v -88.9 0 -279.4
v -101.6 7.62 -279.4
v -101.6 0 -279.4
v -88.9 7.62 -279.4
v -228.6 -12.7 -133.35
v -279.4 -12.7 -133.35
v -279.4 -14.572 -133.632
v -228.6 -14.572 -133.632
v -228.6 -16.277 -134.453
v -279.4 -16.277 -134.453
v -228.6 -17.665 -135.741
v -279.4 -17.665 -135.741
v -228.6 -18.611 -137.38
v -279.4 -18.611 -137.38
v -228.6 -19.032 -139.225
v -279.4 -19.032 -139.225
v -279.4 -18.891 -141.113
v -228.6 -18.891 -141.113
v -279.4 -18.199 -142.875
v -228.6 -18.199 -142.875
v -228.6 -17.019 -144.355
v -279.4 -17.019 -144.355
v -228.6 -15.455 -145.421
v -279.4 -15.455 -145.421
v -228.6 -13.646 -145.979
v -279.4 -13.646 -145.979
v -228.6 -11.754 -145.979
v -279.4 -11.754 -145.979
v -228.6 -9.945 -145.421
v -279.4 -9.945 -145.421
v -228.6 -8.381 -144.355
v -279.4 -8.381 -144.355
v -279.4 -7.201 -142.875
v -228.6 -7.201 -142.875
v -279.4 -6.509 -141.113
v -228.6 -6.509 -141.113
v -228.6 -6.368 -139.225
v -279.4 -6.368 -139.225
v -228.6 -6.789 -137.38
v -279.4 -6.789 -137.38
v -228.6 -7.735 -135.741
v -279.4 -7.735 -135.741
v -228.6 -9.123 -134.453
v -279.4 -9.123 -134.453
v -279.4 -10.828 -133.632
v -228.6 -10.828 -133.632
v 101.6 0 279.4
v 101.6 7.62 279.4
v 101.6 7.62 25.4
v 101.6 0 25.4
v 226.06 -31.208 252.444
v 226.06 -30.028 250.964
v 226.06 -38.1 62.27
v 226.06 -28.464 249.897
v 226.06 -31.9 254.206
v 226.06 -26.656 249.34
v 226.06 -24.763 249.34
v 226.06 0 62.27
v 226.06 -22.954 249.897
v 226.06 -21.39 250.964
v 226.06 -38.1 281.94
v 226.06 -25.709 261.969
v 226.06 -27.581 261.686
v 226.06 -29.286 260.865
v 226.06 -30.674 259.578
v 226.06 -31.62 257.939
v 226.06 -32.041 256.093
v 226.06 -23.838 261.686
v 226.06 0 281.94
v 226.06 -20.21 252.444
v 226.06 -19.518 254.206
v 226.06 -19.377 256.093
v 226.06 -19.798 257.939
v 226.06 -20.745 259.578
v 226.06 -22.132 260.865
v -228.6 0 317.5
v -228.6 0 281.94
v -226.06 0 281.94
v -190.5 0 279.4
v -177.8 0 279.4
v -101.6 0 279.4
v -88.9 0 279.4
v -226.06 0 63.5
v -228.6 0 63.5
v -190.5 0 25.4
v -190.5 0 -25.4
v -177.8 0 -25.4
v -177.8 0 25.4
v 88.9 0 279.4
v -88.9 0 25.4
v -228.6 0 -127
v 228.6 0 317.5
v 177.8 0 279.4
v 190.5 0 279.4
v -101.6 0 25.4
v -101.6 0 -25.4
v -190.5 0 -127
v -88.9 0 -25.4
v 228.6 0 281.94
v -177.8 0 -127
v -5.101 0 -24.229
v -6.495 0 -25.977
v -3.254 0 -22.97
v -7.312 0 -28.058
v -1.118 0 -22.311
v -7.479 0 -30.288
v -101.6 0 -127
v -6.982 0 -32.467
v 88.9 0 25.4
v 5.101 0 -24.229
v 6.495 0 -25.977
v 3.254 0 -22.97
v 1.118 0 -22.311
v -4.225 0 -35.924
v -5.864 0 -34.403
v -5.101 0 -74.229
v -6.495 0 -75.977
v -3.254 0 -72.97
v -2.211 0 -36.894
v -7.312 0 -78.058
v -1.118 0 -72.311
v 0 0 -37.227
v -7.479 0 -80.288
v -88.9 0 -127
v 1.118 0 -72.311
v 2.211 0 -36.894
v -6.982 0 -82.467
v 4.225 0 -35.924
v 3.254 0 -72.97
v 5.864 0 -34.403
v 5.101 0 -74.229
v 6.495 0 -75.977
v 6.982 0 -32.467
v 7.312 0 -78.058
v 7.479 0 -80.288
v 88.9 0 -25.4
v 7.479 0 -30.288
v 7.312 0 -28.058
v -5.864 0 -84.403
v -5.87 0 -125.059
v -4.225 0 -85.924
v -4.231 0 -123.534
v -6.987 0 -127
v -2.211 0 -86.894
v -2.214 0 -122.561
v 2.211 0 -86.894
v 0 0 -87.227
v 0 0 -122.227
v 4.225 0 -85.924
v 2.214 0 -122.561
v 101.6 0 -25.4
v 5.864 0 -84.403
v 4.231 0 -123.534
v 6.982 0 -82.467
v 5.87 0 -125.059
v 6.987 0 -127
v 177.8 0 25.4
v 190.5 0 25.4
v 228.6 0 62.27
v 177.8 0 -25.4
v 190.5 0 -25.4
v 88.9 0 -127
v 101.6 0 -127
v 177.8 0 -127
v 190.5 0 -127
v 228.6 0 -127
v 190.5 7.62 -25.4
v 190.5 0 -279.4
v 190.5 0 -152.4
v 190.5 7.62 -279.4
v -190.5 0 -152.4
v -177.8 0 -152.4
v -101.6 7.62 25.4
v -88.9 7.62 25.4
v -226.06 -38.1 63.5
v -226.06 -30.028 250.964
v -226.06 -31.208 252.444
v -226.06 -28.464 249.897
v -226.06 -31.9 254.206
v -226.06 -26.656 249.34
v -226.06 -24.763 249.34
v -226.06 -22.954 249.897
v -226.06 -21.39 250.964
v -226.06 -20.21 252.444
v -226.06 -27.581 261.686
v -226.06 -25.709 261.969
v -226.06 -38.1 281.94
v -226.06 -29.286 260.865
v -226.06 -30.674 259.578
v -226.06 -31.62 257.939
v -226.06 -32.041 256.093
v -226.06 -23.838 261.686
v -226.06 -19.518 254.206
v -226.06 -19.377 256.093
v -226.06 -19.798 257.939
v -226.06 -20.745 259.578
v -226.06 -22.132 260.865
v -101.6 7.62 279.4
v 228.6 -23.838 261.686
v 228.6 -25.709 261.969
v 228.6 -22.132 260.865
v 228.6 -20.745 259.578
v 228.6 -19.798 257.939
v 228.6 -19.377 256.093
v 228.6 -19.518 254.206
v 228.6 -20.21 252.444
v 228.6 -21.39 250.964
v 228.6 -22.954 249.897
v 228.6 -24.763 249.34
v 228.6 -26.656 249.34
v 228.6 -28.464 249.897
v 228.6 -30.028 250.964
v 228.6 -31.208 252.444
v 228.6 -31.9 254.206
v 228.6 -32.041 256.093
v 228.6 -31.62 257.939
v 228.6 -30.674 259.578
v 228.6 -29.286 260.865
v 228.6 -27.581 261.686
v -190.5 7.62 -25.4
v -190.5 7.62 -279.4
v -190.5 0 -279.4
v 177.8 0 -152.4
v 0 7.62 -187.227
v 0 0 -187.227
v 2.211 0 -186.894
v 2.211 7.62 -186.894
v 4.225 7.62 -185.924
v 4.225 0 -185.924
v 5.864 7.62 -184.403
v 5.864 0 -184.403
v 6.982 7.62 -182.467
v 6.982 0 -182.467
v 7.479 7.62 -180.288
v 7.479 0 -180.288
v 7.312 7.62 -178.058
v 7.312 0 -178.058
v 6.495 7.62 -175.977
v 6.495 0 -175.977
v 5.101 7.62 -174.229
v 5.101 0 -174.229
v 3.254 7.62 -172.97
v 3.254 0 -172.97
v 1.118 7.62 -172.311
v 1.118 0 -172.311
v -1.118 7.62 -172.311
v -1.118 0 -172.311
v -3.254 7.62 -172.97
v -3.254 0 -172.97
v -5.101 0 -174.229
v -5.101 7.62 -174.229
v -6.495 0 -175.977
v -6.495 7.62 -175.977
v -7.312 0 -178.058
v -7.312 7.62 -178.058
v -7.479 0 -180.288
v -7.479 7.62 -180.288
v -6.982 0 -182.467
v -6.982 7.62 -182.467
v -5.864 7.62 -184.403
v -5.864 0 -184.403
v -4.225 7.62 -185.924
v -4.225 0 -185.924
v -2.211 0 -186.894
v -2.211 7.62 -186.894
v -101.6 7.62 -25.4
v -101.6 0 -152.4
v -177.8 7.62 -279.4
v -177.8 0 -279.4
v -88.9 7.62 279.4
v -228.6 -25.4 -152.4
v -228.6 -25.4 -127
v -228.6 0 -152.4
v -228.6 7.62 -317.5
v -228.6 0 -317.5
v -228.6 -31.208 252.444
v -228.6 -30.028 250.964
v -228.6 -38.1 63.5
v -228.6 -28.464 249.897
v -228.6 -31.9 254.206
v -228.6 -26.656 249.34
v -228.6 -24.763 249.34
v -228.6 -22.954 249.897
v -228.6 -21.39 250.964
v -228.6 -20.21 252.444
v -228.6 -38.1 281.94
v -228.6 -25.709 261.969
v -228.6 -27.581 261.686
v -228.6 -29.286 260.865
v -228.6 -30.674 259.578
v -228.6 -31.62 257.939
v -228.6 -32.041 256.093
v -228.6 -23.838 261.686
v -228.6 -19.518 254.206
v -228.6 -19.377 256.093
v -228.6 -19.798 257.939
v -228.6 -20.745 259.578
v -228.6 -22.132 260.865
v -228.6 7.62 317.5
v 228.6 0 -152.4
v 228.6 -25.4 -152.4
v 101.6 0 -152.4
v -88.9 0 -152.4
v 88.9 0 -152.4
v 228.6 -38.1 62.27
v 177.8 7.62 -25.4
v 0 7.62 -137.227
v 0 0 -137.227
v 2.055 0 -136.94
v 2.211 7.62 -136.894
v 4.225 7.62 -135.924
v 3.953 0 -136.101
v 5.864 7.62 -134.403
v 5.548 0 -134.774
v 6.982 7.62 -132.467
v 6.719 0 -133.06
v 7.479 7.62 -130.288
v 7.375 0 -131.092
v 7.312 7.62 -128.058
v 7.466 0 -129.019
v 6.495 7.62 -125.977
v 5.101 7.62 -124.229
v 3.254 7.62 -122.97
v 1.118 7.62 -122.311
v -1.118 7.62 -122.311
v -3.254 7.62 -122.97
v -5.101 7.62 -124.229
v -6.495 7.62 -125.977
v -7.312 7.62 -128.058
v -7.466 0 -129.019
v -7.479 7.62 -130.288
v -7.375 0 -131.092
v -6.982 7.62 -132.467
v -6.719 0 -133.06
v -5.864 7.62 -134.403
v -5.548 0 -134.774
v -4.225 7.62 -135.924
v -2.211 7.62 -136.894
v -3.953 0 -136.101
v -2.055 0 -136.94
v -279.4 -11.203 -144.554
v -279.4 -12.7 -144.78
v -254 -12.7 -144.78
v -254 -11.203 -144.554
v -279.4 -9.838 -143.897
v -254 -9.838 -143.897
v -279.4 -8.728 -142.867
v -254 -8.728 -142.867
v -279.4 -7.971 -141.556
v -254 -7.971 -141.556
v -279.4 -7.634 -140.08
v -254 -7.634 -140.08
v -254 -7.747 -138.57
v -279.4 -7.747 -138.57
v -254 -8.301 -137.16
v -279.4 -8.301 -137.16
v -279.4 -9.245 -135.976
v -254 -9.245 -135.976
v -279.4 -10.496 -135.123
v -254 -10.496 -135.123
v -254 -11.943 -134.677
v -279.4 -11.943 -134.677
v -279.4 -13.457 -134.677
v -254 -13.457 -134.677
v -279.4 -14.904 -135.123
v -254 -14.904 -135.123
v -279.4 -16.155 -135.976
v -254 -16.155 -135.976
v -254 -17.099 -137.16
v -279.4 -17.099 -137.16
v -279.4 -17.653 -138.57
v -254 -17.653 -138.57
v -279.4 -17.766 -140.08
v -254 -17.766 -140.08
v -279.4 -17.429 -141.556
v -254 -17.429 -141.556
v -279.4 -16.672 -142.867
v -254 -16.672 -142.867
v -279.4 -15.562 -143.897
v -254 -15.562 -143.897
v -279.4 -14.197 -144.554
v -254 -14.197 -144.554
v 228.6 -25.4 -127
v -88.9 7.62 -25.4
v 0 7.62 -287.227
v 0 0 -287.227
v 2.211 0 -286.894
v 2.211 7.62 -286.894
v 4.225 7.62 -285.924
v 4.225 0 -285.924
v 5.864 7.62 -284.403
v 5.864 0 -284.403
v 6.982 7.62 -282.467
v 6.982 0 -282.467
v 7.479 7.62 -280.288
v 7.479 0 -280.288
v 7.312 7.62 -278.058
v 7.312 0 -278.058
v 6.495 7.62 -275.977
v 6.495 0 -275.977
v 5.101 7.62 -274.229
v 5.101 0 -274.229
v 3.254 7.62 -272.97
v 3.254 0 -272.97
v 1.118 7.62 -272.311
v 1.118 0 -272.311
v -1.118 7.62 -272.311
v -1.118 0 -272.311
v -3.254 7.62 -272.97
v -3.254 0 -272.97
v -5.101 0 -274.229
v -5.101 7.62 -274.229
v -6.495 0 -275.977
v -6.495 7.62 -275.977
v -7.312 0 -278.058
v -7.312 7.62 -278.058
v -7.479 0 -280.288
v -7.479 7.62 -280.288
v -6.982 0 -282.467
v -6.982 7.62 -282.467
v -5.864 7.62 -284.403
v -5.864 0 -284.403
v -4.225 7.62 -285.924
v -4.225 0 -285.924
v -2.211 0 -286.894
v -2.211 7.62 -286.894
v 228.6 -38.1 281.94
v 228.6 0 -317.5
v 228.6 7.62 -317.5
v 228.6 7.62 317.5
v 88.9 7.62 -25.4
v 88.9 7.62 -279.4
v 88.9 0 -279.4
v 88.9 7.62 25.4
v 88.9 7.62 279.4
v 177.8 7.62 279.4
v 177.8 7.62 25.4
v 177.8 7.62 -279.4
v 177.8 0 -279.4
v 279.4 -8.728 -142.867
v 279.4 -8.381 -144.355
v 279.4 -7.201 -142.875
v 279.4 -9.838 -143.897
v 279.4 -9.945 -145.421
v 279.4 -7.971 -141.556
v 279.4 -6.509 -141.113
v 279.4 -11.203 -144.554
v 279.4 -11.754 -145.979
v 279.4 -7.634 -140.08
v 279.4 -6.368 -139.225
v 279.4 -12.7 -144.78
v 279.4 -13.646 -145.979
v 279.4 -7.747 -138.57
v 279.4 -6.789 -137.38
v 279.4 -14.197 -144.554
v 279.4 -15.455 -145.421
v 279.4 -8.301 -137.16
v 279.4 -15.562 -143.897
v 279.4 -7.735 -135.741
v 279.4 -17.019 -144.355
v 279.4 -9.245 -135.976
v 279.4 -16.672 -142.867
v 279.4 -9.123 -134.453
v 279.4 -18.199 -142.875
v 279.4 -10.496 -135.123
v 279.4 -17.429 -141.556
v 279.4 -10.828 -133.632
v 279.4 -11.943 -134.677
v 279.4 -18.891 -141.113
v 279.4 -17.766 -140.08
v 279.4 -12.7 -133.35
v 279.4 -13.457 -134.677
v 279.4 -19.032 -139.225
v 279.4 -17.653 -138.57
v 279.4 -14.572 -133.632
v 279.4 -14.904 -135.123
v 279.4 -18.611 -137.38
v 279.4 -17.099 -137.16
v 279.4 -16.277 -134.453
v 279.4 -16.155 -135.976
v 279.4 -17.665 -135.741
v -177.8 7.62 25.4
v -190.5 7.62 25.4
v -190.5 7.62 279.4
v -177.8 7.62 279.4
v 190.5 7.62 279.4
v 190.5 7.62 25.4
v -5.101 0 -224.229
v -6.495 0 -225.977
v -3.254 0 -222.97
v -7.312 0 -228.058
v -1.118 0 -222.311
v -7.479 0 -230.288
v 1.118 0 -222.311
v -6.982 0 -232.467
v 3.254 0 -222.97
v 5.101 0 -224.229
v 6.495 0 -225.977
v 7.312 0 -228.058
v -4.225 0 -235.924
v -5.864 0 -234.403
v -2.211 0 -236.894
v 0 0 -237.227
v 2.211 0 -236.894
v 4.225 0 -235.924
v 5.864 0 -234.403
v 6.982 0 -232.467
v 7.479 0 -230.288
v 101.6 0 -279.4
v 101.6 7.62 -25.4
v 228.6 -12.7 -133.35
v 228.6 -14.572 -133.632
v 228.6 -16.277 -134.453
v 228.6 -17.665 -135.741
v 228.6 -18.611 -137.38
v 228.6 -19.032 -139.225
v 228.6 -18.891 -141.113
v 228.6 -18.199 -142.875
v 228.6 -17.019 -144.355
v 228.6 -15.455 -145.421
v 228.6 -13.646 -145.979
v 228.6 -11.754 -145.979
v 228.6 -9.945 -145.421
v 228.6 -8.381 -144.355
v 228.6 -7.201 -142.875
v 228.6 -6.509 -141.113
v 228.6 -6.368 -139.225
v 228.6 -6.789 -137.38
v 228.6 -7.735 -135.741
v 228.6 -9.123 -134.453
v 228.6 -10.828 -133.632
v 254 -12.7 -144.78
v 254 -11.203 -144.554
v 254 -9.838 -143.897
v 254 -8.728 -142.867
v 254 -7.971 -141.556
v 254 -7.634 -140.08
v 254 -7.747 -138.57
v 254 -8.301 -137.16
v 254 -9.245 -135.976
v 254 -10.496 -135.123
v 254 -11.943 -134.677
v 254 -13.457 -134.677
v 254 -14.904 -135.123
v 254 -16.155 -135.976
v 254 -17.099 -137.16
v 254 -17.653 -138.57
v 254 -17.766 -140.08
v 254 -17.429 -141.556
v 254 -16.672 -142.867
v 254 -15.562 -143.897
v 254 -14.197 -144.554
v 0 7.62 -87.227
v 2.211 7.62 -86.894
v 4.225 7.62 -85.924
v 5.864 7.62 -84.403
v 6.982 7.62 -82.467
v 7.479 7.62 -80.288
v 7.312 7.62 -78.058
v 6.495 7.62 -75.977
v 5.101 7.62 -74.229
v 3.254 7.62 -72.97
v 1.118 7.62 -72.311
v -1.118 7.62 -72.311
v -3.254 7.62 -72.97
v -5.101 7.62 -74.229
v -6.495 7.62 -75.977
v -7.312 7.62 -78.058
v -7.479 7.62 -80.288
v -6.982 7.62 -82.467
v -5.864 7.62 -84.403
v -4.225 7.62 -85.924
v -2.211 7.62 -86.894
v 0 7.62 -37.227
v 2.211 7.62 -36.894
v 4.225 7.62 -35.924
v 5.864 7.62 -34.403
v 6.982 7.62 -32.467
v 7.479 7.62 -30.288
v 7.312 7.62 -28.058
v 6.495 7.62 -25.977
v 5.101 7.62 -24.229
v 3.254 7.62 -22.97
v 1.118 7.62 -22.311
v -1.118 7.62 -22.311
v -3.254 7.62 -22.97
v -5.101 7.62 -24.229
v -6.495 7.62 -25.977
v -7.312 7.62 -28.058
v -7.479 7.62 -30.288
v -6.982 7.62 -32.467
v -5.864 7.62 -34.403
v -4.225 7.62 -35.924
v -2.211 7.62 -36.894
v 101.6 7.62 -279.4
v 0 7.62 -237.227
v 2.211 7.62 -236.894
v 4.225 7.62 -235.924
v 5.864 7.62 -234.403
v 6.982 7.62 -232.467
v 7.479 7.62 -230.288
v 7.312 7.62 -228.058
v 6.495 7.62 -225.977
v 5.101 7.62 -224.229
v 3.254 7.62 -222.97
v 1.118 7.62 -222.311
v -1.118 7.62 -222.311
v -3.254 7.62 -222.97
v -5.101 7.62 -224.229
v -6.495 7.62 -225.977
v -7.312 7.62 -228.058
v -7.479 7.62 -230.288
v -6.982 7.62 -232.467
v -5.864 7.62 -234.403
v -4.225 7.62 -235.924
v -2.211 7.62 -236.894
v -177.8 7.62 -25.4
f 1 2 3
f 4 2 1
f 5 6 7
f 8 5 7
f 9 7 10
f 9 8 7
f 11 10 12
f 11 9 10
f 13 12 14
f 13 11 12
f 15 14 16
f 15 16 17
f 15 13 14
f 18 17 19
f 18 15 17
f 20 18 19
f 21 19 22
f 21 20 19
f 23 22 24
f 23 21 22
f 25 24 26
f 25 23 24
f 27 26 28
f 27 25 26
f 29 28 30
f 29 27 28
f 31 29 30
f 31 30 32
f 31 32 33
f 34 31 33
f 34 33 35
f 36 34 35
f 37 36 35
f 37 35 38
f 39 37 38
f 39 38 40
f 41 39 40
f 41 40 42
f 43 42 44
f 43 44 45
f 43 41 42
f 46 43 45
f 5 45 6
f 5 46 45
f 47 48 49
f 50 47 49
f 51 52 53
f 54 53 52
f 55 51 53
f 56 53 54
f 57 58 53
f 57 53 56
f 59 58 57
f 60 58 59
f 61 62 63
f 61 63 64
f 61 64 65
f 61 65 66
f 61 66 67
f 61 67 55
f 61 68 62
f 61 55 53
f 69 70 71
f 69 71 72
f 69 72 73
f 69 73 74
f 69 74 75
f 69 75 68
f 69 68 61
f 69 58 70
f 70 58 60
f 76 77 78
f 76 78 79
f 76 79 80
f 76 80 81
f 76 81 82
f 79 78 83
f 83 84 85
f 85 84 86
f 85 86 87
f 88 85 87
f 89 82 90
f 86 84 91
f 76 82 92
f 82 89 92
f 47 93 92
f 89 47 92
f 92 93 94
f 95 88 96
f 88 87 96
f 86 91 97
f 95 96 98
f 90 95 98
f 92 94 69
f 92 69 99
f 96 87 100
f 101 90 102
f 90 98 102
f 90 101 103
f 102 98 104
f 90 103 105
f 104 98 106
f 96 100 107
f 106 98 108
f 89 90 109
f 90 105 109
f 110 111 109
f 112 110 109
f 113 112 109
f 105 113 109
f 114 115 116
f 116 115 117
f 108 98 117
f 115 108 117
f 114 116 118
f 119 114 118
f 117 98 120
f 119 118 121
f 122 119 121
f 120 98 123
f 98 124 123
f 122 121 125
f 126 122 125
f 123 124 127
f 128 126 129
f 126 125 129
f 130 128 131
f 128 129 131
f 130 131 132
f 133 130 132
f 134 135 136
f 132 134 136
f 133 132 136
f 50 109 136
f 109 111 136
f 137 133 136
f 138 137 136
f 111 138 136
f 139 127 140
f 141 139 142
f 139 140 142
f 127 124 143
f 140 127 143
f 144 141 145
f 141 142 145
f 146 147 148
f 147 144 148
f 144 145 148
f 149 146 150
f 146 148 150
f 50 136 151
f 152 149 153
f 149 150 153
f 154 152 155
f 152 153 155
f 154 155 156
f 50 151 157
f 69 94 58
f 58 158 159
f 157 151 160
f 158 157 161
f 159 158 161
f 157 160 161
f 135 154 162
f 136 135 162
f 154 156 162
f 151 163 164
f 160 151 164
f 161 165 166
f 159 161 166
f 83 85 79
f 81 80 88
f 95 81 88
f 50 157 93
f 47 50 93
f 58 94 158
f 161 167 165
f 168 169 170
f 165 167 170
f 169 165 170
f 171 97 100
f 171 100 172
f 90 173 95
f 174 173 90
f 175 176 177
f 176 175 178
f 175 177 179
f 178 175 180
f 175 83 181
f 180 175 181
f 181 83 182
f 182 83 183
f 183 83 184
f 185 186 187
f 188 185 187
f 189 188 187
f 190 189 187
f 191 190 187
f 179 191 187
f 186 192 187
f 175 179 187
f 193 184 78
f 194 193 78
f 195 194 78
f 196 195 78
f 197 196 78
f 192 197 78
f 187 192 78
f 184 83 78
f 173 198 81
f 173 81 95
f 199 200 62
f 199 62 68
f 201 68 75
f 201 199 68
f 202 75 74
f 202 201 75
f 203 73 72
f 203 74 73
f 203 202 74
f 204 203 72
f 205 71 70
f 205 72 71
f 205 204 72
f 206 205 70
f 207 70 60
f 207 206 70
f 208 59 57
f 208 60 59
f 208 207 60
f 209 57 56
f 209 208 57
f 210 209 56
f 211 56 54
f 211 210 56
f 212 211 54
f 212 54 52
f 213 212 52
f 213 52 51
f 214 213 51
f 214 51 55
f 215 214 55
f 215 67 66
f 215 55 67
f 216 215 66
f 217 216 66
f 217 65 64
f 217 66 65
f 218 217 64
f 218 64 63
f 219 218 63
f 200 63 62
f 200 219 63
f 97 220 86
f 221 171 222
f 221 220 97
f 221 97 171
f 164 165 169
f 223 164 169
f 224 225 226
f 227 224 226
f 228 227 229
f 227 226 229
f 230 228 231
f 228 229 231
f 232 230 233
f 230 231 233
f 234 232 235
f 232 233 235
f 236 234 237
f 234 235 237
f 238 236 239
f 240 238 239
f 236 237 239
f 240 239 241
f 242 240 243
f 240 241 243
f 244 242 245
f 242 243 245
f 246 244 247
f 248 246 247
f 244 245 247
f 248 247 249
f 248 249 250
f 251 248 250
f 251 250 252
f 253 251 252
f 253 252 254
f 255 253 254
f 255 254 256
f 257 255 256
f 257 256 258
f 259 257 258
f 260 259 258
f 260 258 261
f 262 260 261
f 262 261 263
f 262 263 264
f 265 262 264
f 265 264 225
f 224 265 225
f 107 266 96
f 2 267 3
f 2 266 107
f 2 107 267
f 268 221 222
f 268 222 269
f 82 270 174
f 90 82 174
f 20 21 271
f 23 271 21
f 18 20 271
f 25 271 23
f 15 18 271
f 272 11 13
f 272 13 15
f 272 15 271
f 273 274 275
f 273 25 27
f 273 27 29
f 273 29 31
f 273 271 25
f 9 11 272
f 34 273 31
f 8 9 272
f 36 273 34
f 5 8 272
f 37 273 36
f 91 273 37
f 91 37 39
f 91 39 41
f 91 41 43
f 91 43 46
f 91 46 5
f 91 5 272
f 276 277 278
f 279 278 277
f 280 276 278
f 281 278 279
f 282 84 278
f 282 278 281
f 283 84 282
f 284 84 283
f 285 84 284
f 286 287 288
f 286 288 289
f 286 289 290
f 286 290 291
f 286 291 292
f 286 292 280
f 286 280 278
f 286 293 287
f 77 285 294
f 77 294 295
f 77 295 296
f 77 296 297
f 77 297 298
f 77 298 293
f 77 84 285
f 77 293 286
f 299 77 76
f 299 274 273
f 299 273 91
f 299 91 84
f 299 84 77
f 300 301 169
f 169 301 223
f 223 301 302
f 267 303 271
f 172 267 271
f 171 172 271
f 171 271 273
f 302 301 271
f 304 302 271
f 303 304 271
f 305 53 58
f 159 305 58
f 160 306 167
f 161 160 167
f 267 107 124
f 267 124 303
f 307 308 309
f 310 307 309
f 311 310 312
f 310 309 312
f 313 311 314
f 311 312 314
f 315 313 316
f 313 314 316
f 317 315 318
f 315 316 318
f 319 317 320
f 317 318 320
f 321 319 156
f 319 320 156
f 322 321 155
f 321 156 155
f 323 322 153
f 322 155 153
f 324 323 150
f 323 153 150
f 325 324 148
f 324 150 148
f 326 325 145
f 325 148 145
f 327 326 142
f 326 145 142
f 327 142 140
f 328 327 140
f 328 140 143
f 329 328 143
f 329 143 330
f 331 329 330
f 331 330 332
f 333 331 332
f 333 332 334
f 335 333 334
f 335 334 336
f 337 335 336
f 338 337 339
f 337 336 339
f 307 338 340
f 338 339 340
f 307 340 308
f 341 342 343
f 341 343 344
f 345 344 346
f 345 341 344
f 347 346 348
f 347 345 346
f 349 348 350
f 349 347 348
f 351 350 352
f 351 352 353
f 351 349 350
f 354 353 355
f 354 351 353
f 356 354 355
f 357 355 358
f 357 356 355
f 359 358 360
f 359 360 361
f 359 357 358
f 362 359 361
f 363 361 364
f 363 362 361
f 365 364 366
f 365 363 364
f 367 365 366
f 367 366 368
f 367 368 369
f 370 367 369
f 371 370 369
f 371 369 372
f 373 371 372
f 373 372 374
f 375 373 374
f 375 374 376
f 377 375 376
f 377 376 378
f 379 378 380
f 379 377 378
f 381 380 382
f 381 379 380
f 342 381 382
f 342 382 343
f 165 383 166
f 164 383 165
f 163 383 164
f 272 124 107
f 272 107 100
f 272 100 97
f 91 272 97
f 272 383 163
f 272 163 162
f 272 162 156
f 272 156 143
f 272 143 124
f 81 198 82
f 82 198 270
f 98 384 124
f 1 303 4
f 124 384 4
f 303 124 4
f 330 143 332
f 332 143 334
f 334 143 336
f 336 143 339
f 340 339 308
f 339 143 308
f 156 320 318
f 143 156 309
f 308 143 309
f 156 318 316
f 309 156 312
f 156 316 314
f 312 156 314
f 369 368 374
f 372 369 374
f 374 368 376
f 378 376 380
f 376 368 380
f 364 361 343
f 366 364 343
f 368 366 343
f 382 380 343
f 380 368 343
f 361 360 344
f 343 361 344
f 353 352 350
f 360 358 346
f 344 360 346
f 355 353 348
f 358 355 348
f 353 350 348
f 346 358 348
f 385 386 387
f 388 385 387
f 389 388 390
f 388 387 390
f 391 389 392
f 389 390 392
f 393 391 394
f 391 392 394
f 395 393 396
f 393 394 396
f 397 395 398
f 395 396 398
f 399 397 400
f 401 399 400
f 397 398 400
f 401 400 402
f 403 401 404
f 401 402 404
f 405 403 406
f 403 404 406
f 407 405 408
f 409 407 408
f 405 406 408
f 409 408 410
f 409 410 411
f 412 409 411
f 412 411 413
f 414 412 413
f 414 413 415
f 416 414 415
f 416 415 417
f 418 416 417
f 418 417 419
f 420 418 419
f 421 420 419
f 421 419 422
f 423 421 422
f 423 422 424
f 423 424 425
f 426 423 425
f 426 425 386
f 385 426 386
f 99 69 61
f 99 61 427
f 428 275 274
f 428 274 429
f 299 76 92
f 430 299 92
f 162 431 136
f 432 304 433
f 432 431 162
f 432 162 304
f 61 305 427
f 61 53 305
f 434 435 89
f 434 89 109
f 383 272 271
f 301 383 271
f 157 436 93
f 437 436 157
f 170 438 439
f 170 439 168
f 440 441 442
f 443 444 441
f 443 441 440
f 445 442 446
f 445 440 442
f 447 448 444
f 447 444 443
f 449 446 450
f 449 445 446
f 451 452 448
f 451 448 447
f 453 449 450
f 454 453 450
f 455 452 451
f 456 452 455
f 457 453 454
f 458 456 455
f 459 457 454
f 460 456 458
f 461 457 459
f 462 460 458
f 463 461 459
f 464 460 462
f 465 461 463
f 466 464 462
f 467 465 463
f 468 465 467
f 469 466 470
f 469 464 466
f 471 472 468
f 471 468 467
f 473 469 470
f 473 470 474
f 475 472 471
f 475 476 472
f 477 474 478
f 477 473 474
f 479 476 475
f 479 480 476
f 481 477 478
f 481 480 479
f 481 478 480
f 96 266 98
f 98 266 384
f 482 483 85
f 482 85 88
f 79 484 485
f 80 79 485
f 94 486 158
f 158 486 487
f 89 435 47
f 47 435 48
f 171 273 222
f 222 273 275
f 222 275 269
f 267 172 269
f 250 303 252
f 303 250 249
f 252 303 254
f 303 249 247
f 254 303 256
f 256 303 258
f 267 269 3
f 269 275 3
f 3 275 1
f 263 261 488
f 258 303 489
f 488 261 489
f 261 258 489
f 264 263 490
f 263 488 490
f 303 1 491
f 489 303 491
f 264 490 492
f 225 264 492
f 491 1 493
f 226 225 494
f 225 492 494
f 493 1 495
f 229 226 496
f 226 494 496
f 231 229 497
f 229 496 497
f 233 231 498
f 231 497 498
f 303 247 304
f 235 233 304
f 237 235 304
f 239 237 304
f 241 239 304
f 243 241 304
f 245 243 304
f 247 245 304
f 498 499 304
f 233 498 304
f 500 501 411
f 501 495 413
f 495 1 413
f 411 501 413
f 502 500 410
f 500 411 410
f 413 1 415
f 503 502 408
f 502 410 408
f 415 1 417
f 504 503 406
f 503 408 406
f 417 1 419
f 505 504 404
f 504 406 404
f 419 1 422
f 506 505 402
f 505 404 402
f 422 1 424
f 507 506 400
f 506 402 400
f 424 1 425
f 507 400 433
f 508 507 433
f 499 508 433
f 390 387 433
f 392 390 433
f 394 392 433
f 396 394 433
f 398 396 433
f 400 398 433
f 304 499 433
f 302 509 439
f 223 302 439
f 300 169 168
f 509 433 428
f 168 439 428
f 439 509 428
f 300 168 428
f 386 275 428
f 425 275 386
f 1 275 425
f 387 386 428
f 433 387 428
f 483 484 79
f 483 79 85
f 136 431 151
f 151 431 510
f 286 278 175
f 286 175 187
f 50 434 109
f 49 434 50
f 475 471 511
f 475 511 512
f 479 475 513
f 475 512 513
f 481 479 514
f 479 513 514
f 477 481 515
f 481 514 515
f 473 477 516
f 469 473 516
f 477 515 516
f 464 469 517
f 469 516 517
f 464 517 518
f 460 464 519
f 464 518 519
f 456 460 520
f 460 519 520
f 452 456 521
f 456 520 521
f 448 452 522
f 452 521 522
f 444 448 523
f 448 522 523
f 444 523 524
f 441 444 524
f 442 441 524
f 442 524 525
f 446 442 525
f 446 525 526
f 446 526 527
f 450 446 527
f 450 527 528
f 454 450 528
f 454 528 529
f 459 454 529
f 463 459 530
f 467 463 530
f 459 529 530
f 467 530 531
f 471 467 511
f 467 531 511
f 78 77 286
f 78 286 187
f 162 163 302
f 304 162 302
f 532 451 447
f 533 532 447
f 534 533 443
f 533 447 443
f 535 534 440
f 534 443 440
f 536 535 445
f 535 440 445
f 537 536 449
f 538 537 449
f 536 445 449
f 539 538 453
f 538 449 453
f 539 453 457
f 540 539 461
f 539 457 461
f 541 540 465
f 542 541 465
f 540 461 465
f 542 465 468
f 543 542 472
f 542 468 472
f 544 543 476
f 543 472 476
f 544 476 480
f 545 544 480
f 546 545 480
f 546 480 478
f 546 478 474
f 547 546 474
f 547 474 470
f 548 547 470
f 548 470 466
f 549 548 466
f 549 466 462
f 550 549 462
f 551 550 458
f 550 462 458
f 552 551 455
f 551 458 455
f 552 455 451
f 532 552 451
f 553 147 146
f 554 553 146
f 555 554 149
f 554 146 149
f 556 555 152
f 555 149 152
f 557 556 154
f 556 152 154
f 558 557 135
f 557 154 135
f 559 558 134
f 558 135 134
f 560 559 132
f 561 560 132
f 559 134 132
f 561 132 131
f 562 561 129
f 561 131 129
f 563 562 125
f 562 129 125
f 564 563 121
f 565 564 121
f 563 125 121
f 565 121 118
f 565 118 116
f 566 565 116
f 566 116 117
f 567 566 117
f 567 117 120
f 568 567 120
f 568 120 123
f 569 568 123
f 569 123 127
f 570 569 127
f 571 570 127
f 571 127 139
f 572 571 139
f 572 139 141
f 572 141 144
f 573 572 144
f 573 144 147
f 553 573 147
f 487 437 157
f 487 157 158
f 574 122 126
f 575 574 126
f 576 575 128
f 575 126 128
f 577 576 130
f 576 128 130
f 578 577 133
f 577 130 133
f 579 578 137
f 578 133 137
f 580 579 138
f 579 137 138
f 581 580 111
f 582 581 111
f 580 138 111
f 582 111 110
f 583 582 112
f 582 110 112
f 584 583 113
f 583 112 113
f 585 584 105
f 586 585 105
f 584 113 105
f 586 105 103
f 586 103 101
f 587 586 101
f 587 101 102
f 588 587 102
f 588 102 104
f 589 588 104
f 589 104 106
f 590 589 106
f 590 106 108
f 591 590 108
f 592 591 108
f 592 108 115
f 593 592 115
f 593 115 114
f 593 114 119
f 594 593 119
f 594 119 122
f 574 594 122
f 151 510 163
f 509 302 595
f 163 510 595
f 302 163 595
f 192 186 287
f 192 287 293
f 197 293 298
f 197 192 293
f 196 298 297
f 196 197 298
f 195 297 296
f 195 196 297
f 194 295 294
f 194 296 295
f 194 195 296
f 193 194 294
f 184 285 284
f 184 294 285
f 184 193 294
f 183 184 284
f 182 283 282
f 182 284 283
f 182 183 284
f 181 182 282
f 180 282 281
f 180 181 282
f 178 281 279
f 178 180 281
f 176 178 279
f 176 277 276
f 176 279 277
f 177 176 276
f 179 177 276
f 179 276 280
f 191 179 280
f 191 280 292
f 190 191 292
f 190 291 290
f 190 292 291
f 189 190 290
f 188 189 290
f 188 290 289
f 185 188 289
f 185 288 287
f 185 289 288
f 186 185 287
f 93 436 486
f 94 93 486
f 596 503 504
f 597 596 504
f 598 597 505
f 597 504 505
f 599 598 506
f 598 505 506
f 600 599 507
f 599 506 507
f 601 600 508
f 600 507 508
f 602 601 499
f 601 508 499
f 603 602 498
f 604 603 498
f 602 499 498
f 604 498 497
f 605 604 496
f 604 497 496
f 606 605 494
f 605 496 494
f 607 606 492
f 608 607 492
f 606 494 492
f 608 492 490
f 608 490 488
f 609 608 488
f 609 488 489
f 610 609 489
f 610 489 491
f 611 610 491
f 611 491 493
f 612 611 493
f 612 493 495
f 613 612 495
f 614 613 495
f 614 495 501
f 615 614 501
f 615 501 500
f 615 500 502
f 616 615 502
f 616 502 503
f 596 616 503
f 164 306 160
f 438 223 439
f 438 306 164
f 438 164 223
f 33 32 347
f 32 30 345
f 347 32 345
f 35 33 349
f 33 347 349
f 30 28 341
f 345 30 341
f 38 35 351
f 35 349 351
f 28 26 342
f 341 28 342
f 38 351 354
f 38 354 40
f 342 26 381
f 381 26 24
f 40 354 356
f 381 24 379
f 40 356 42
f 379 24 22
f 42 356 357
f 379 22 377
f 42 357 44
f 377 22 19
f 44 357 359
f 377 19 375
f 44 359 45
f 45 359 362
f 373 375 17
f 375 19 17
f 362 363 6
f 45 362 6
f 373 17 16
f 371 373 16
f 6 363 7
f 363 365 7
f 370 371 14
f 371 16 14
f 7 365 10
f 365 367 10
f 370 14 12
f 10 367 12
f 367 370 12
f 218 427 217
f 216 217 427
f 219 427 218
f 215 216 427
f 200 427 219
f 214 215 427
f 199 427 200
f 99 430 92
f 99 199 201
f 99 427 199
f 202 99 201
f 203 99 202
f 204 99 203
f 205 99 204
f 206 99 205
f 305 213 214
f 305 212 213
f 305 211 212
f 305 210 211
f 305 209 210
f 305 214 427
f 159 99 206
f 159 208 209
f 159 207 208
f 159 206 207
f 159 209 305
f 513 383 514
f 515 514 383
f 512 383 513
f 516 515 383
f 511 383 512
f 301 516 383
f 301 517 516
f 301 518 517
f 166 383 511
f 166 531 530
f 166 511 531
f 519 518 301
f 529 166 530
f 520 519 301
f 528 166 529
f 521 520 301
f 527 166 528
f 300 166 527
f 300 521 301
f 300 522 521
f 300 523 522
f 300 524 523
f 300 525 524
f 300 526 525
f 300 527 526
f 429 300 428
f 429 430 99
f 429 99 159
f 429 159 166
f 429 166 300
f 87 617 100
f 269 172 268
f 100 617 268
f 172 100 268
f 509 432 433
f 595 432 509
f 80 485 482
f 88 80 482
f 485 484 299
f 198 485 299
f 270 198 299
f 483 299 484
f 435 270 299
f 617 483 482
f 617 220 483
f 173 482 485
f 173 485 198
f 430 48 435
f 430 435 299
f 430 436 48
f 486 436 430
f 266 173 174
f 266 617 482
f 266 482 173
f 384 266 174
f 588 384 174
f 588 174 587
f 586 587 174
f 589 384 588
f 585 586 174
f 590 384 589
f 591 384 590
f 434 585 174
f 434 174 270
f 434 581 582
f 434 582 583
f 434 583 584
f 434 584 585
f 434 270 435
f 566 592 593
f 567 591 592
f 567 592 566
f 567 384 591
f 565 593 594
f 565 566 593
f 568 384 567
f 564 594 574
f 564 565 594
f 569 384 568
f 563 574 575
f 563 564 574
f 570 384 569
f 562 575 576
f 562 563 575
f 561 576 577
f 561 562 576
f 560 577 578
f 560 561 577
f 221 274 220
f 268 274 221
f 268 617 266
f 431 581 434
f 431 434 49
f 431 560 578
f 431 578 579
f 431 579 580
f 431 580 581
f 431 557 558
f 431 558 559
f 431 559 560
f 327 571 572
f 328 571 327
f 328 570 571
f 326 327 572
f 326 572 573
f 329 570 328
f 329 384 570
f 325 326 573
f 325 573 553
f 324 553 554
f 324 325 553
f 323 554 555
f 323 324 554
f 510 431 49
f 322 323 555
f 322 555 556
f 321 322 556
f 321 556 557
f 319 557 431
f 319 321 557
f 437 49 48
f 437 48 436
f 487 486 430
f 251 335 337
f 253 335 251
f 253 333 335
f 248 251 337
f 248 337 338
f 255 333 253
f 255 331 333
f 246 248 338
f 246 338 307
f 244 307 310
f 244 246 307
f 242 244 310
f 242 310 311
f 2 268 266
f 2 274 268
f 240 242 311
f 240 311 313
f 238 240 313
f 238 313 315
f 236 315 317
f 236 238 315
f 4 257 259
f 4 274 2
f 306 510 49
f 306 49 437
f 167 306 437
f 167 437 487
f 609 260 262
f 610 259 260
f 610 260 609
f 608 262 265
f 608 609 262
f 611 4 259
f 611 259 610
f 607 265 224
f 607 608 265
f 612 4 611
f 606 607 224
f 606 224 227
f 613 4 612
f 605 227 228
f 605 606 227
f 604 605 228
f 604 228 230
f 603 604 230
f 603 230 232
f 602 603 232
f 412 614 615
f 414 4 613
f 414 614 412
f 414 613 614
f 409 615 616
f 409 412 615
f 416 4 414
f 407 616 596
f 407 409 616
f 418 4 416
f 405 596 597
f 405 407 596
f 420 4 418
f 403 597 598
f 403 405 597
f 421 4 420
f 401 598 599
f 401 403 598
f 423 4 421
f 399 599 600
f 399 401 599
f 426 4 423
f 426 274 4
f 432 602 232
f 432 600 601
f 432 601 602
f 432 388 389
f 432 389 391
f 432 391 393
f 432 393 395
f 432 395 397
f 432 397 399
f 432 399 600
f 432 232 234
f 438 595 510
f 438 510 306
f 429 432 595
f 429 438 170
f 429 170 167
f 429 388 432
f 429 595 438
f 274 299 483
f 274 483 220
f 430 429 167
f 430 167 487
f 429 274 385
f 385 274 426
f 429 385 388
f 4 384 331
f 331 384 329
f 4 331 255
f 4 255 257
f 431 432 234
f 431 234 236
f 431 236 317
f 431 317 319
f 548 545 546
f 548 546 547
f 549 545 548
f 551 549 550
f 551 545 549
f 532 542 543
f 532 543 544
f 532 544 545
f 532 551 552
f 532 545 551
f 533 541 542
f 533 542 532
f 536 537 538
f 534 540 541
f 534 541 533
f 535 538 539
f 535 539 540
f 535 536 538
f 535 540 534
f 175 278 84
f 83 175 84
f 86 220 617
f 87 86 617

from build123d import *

# Parameters (mm, degrees)
SKETCH1_W               = 457.2
SKETCH1_H               = 635
BOSS_EXTRUDE1_DEPTH     = 7.62
SKETCH2_W               = 12.7
SKETCH2_H               = 254
CUT_EXTRUDE1_DEPTH      = 392.308413403
SKETCH5_W               = 25.4
SKETCH5_H               = 25.4
BOSS_EXTRUDE3_DEPTH     = 228.6
SKETCH6_R               = 6.35
BOSS_EXTRUDE4_DEPTH     = 50.8
BOSS_EXTRUDE6_DEPTH     = 38.1
CUT_EXTRUDE2_DEPTH      = 426.395026299
CUT_EXTRUDE2_DEPTH_BACK = 38.1
SKETCH8_W               = 152.4
SKETCH8_H               = 38.1
BOSS_EXTRUDE7_DEPTH     = 2.54
SKETCH9_W               = 457.2
SKETCH9_H               = 38.1
CUT_EXTRUDE3_DEPTH      = 10.16
CUT_EXTRUDE4_DEPTH      = 601.268156743
CUT_EXTRUDE4_DEPTH_BACK = 601.268156743
SKETCH10_R              = 6.35
SKETCH11_R              = 5.08
CUT_EXTRUDE5_DEPTH      = 25.4
SKETCH12_W              = 67.801888186
SKETCH12_H              = 38.1
CUT_EXTRUDE7_DEPTH      = 599.120114693
SKETCH16_R              = 7.5
CUT_EXTRUDE9_DEPTH      = 425.643638831
LPATTERN1_COUNT         = 5
LPATTERN1_PITCH         = 50
LPATTERN2_COUNT         = 3
LPATTERN2_PITCH         = 50


with BuildPart() as part:
    # Sketch1 → Boss-Extrude1 (new body)
    with BuildSketch(Plane(origin=(0, 0, 0), x_dir=(1, 0, 0), z_dir=(0, 1, 0))):
        Rectangle(SKETCH1_W, SKETCH1_H)
    extrude(amount=BOSS_EXTRUDE1_DEPTH)

    # Sketch2 → Cut-Extrude1 (cut, through all)
    with BuildSketch(Plane(origin=(0, 7.62, 0), x_dir=(1, 0, 0), z_dir=(0, 1, 0))):
        with Locations((-95.25, 152.4)):
            Rectangle(SKETCH2_W, SKETCH2_H)
        with Locations((-95.25, -152.4)):
            Rectangle(SKETCH2_W, SKETCH2_H)
        with Locations((-184.15, 152.4)):
            Rectangle(SKETCH2_W, SKETCH2_H)
        with Locations((-184.15, -152.4)):
            Rectangle(SKETCH2_W, SKETCH2_H)
        with Locations((184.15, 152.4)):
            Rectangle(SKETCH2_W, SKETCH2_H)
        with Locations((95.25, 152.4)):
            Rectangle(SKETCH2_W, SKETCH2_H)
        with Locations((184.15, -152.4)):
            Rectangle(SKETCH2_W, SKETCH2_H)
        with Locations((95.25, -152.4)):
            Rectangle(SKETCH2_W, SKETCH2_H)
    extrude(amount=-CUT_EXTRUDE1_DEPTH, mode=Mode.SUBTRACT)

    # Sketch5 → Boss-Extrude3 (add)
    with BuildSketch(Plane(origin=(228.6, 0, 0), x_dir=(0, 0, -1), z_dir=(1, 0, 0))):
        with Locations((139.7, -12.7)):
            Rectangle(SKETCH5_W, SKETCH5_H)
    boss_extrude3 = extrude(amount=-BOSS_EXTRUDE3_DEPTH)

    # Sketch6 → Boss-Extrude4 (add)
    with BuildSketch(Plane(origin=(228.6, 0, 0), x_dir=(0, 0, -1), z_dir=(1, 0, 0))):
        with Locations(Location((139.7, -12.7, 0), (0, 0, 180))):
            Circle(SKETCH6_R)
    boss_extrude4 = extrude(amount=BOSS_EXTRUDE4_DEPTH)

    # Sketch3 → Boss-Extrude6 (add)
    with BuildSketch(Plane.XZ):
        Polygon((-228.6, 292.1), (228.6, 292.1), (228.6, -5.532066332), (-228.6, 215.9), align=None)
    extrude(amount=BOSS_EXTRUDE6_DEPTH)

    # Mirror2: Boss-Extrude3, Boss-Extrude4 across plane
    add(boss_extrude3.mirror(Plane(origin=(0, 0, 0), x_dir=(0, 0, 1), z_dir=(1, 0, 0))))
    add(boss_extrude4.mirror(Plane(origin=(0, 0, 0), x_dir=(0, 0, 1), z_dir=(1, 0, 0))))

    # Sketch7 → Cut-Extrude2 (cut, two sides: drawn at the far end of the back side and taken through both)
    with BuildSketch(Plane.XZ.offset(38.1).offset(-CUT_EXTRUDE2_DEPTH_BACK)):
        Polygon((-226.06, 214.669821854), (226.06, -4.301888186), (226.06, 289.56), (-226.06, 289.56), align=None)
    extrude(amount=CUT_EXTRUDE2_DEPTH + CUT_EXTRUDE2_DEPTH_BACK, mode=Mode.SUBTRACT)

    # Sketch8 → Boss-Extrude7 (add)
    with BuildSketch(Plane.ZY.offset(228.6)):
        with Locations((139.7, -19.05)):
            Rectangle(SKETCH8_W, SKETCH8_H)
    extrude(amount=-BOSS_EXTRUDE7_DEPTH)

    # Sketch9 → Cut-Extrude3 (cut)
    with BuildSketch(Plane.XY.offset(292.1)):
        with Locations((0, -19.05)):
            Rectangle(SKETCH9_W, SKETCH9_H)
    extrude(amount=-CUT_EXTRUDE3_DEPTH, mode=Mode.SUBTRACT)

    # Sketch10 → Cut-Extrude4 (cut, two sides: drawn at the far end of the back side and taken through both)
    with BuildSketch(Plane.ZY.offset(228.6).offset(-CUT_EXTRUDE4_DEPTH_BACK)):
        with Locations((255.61861162, -25.709236818)):
            Circle(SKETCH10_R)
    extrude(amount=CUT_EXTRUDE4_DEPTH + CUT_EXTRUDE4_DEPTH_BACK, mode=Mode.SUBTRACT)

    # Sketch11 → Cut-Extrude5 (cut)
    with BuildSketch(Plane(origin=(279.4, 0, 0), x_dir=(0, 0, -1), z_dir=(1, 0, 0))):
        with Locations((139.7, -12.7)):
            Circle(SKETCH11_R)
    cut_extrude5 = extrude(amount=-CUT_EXTRUDE5_DEPTH, mode=Mode.SUBTRACT)

    # Mirror3: Cut-Extrude5 across plane
    add(cut_extrude5.mirror(Plane(origin=(0, 0, 0), x_dir=(0, 0, 1), z_dir=(1, 0, 0))), mode=Mode.SUBTRACT)

    # Sketch12 → Cut-Extrude7 (cut, through all)
    with BuildSketch(Plane.ZY.offset(-226.06)):
        with Locations((28.368877761, -19.05)):
            Rectangle(SKETCH12_W, SKETCH12_H)
    extrude(amount=-CUT_EXTRUDE7_DEPTH, mode=Mode.SUBTRACT)

    # Sketch16 → Cut-Extrude9 (cut, through all)
    with BuildSketch(Plane.XZ):
        with Locations(Location((0, -229.727054267, 0), (0, 0, 270))):
            Circle(SKETCH16_R)
    cut_extrude9 = extrude(amount=-CUT_EXTRUDE9_DEPTH, mode=Mode.SUBTRACT)

    # LPattern1: Cut-Extrude9 ×5
    with Locations(*[(0, 0, i * LPATTERN1_PITCH) for i in range(1, LPATTERN1_COUNT)]):
        add(cut_extrude9, mode=Mode.SUBTRACT)

    # LPattern2: Cut-Extrude9 ×3
    with Locations(*[(0, 0, -i * LPATTERN2_PITCH) for i in range(1, LPATTERN2_COUNT)]):
        add(cut_extrude9, mode=Mode.SUBTRACT)


solid = part.part
